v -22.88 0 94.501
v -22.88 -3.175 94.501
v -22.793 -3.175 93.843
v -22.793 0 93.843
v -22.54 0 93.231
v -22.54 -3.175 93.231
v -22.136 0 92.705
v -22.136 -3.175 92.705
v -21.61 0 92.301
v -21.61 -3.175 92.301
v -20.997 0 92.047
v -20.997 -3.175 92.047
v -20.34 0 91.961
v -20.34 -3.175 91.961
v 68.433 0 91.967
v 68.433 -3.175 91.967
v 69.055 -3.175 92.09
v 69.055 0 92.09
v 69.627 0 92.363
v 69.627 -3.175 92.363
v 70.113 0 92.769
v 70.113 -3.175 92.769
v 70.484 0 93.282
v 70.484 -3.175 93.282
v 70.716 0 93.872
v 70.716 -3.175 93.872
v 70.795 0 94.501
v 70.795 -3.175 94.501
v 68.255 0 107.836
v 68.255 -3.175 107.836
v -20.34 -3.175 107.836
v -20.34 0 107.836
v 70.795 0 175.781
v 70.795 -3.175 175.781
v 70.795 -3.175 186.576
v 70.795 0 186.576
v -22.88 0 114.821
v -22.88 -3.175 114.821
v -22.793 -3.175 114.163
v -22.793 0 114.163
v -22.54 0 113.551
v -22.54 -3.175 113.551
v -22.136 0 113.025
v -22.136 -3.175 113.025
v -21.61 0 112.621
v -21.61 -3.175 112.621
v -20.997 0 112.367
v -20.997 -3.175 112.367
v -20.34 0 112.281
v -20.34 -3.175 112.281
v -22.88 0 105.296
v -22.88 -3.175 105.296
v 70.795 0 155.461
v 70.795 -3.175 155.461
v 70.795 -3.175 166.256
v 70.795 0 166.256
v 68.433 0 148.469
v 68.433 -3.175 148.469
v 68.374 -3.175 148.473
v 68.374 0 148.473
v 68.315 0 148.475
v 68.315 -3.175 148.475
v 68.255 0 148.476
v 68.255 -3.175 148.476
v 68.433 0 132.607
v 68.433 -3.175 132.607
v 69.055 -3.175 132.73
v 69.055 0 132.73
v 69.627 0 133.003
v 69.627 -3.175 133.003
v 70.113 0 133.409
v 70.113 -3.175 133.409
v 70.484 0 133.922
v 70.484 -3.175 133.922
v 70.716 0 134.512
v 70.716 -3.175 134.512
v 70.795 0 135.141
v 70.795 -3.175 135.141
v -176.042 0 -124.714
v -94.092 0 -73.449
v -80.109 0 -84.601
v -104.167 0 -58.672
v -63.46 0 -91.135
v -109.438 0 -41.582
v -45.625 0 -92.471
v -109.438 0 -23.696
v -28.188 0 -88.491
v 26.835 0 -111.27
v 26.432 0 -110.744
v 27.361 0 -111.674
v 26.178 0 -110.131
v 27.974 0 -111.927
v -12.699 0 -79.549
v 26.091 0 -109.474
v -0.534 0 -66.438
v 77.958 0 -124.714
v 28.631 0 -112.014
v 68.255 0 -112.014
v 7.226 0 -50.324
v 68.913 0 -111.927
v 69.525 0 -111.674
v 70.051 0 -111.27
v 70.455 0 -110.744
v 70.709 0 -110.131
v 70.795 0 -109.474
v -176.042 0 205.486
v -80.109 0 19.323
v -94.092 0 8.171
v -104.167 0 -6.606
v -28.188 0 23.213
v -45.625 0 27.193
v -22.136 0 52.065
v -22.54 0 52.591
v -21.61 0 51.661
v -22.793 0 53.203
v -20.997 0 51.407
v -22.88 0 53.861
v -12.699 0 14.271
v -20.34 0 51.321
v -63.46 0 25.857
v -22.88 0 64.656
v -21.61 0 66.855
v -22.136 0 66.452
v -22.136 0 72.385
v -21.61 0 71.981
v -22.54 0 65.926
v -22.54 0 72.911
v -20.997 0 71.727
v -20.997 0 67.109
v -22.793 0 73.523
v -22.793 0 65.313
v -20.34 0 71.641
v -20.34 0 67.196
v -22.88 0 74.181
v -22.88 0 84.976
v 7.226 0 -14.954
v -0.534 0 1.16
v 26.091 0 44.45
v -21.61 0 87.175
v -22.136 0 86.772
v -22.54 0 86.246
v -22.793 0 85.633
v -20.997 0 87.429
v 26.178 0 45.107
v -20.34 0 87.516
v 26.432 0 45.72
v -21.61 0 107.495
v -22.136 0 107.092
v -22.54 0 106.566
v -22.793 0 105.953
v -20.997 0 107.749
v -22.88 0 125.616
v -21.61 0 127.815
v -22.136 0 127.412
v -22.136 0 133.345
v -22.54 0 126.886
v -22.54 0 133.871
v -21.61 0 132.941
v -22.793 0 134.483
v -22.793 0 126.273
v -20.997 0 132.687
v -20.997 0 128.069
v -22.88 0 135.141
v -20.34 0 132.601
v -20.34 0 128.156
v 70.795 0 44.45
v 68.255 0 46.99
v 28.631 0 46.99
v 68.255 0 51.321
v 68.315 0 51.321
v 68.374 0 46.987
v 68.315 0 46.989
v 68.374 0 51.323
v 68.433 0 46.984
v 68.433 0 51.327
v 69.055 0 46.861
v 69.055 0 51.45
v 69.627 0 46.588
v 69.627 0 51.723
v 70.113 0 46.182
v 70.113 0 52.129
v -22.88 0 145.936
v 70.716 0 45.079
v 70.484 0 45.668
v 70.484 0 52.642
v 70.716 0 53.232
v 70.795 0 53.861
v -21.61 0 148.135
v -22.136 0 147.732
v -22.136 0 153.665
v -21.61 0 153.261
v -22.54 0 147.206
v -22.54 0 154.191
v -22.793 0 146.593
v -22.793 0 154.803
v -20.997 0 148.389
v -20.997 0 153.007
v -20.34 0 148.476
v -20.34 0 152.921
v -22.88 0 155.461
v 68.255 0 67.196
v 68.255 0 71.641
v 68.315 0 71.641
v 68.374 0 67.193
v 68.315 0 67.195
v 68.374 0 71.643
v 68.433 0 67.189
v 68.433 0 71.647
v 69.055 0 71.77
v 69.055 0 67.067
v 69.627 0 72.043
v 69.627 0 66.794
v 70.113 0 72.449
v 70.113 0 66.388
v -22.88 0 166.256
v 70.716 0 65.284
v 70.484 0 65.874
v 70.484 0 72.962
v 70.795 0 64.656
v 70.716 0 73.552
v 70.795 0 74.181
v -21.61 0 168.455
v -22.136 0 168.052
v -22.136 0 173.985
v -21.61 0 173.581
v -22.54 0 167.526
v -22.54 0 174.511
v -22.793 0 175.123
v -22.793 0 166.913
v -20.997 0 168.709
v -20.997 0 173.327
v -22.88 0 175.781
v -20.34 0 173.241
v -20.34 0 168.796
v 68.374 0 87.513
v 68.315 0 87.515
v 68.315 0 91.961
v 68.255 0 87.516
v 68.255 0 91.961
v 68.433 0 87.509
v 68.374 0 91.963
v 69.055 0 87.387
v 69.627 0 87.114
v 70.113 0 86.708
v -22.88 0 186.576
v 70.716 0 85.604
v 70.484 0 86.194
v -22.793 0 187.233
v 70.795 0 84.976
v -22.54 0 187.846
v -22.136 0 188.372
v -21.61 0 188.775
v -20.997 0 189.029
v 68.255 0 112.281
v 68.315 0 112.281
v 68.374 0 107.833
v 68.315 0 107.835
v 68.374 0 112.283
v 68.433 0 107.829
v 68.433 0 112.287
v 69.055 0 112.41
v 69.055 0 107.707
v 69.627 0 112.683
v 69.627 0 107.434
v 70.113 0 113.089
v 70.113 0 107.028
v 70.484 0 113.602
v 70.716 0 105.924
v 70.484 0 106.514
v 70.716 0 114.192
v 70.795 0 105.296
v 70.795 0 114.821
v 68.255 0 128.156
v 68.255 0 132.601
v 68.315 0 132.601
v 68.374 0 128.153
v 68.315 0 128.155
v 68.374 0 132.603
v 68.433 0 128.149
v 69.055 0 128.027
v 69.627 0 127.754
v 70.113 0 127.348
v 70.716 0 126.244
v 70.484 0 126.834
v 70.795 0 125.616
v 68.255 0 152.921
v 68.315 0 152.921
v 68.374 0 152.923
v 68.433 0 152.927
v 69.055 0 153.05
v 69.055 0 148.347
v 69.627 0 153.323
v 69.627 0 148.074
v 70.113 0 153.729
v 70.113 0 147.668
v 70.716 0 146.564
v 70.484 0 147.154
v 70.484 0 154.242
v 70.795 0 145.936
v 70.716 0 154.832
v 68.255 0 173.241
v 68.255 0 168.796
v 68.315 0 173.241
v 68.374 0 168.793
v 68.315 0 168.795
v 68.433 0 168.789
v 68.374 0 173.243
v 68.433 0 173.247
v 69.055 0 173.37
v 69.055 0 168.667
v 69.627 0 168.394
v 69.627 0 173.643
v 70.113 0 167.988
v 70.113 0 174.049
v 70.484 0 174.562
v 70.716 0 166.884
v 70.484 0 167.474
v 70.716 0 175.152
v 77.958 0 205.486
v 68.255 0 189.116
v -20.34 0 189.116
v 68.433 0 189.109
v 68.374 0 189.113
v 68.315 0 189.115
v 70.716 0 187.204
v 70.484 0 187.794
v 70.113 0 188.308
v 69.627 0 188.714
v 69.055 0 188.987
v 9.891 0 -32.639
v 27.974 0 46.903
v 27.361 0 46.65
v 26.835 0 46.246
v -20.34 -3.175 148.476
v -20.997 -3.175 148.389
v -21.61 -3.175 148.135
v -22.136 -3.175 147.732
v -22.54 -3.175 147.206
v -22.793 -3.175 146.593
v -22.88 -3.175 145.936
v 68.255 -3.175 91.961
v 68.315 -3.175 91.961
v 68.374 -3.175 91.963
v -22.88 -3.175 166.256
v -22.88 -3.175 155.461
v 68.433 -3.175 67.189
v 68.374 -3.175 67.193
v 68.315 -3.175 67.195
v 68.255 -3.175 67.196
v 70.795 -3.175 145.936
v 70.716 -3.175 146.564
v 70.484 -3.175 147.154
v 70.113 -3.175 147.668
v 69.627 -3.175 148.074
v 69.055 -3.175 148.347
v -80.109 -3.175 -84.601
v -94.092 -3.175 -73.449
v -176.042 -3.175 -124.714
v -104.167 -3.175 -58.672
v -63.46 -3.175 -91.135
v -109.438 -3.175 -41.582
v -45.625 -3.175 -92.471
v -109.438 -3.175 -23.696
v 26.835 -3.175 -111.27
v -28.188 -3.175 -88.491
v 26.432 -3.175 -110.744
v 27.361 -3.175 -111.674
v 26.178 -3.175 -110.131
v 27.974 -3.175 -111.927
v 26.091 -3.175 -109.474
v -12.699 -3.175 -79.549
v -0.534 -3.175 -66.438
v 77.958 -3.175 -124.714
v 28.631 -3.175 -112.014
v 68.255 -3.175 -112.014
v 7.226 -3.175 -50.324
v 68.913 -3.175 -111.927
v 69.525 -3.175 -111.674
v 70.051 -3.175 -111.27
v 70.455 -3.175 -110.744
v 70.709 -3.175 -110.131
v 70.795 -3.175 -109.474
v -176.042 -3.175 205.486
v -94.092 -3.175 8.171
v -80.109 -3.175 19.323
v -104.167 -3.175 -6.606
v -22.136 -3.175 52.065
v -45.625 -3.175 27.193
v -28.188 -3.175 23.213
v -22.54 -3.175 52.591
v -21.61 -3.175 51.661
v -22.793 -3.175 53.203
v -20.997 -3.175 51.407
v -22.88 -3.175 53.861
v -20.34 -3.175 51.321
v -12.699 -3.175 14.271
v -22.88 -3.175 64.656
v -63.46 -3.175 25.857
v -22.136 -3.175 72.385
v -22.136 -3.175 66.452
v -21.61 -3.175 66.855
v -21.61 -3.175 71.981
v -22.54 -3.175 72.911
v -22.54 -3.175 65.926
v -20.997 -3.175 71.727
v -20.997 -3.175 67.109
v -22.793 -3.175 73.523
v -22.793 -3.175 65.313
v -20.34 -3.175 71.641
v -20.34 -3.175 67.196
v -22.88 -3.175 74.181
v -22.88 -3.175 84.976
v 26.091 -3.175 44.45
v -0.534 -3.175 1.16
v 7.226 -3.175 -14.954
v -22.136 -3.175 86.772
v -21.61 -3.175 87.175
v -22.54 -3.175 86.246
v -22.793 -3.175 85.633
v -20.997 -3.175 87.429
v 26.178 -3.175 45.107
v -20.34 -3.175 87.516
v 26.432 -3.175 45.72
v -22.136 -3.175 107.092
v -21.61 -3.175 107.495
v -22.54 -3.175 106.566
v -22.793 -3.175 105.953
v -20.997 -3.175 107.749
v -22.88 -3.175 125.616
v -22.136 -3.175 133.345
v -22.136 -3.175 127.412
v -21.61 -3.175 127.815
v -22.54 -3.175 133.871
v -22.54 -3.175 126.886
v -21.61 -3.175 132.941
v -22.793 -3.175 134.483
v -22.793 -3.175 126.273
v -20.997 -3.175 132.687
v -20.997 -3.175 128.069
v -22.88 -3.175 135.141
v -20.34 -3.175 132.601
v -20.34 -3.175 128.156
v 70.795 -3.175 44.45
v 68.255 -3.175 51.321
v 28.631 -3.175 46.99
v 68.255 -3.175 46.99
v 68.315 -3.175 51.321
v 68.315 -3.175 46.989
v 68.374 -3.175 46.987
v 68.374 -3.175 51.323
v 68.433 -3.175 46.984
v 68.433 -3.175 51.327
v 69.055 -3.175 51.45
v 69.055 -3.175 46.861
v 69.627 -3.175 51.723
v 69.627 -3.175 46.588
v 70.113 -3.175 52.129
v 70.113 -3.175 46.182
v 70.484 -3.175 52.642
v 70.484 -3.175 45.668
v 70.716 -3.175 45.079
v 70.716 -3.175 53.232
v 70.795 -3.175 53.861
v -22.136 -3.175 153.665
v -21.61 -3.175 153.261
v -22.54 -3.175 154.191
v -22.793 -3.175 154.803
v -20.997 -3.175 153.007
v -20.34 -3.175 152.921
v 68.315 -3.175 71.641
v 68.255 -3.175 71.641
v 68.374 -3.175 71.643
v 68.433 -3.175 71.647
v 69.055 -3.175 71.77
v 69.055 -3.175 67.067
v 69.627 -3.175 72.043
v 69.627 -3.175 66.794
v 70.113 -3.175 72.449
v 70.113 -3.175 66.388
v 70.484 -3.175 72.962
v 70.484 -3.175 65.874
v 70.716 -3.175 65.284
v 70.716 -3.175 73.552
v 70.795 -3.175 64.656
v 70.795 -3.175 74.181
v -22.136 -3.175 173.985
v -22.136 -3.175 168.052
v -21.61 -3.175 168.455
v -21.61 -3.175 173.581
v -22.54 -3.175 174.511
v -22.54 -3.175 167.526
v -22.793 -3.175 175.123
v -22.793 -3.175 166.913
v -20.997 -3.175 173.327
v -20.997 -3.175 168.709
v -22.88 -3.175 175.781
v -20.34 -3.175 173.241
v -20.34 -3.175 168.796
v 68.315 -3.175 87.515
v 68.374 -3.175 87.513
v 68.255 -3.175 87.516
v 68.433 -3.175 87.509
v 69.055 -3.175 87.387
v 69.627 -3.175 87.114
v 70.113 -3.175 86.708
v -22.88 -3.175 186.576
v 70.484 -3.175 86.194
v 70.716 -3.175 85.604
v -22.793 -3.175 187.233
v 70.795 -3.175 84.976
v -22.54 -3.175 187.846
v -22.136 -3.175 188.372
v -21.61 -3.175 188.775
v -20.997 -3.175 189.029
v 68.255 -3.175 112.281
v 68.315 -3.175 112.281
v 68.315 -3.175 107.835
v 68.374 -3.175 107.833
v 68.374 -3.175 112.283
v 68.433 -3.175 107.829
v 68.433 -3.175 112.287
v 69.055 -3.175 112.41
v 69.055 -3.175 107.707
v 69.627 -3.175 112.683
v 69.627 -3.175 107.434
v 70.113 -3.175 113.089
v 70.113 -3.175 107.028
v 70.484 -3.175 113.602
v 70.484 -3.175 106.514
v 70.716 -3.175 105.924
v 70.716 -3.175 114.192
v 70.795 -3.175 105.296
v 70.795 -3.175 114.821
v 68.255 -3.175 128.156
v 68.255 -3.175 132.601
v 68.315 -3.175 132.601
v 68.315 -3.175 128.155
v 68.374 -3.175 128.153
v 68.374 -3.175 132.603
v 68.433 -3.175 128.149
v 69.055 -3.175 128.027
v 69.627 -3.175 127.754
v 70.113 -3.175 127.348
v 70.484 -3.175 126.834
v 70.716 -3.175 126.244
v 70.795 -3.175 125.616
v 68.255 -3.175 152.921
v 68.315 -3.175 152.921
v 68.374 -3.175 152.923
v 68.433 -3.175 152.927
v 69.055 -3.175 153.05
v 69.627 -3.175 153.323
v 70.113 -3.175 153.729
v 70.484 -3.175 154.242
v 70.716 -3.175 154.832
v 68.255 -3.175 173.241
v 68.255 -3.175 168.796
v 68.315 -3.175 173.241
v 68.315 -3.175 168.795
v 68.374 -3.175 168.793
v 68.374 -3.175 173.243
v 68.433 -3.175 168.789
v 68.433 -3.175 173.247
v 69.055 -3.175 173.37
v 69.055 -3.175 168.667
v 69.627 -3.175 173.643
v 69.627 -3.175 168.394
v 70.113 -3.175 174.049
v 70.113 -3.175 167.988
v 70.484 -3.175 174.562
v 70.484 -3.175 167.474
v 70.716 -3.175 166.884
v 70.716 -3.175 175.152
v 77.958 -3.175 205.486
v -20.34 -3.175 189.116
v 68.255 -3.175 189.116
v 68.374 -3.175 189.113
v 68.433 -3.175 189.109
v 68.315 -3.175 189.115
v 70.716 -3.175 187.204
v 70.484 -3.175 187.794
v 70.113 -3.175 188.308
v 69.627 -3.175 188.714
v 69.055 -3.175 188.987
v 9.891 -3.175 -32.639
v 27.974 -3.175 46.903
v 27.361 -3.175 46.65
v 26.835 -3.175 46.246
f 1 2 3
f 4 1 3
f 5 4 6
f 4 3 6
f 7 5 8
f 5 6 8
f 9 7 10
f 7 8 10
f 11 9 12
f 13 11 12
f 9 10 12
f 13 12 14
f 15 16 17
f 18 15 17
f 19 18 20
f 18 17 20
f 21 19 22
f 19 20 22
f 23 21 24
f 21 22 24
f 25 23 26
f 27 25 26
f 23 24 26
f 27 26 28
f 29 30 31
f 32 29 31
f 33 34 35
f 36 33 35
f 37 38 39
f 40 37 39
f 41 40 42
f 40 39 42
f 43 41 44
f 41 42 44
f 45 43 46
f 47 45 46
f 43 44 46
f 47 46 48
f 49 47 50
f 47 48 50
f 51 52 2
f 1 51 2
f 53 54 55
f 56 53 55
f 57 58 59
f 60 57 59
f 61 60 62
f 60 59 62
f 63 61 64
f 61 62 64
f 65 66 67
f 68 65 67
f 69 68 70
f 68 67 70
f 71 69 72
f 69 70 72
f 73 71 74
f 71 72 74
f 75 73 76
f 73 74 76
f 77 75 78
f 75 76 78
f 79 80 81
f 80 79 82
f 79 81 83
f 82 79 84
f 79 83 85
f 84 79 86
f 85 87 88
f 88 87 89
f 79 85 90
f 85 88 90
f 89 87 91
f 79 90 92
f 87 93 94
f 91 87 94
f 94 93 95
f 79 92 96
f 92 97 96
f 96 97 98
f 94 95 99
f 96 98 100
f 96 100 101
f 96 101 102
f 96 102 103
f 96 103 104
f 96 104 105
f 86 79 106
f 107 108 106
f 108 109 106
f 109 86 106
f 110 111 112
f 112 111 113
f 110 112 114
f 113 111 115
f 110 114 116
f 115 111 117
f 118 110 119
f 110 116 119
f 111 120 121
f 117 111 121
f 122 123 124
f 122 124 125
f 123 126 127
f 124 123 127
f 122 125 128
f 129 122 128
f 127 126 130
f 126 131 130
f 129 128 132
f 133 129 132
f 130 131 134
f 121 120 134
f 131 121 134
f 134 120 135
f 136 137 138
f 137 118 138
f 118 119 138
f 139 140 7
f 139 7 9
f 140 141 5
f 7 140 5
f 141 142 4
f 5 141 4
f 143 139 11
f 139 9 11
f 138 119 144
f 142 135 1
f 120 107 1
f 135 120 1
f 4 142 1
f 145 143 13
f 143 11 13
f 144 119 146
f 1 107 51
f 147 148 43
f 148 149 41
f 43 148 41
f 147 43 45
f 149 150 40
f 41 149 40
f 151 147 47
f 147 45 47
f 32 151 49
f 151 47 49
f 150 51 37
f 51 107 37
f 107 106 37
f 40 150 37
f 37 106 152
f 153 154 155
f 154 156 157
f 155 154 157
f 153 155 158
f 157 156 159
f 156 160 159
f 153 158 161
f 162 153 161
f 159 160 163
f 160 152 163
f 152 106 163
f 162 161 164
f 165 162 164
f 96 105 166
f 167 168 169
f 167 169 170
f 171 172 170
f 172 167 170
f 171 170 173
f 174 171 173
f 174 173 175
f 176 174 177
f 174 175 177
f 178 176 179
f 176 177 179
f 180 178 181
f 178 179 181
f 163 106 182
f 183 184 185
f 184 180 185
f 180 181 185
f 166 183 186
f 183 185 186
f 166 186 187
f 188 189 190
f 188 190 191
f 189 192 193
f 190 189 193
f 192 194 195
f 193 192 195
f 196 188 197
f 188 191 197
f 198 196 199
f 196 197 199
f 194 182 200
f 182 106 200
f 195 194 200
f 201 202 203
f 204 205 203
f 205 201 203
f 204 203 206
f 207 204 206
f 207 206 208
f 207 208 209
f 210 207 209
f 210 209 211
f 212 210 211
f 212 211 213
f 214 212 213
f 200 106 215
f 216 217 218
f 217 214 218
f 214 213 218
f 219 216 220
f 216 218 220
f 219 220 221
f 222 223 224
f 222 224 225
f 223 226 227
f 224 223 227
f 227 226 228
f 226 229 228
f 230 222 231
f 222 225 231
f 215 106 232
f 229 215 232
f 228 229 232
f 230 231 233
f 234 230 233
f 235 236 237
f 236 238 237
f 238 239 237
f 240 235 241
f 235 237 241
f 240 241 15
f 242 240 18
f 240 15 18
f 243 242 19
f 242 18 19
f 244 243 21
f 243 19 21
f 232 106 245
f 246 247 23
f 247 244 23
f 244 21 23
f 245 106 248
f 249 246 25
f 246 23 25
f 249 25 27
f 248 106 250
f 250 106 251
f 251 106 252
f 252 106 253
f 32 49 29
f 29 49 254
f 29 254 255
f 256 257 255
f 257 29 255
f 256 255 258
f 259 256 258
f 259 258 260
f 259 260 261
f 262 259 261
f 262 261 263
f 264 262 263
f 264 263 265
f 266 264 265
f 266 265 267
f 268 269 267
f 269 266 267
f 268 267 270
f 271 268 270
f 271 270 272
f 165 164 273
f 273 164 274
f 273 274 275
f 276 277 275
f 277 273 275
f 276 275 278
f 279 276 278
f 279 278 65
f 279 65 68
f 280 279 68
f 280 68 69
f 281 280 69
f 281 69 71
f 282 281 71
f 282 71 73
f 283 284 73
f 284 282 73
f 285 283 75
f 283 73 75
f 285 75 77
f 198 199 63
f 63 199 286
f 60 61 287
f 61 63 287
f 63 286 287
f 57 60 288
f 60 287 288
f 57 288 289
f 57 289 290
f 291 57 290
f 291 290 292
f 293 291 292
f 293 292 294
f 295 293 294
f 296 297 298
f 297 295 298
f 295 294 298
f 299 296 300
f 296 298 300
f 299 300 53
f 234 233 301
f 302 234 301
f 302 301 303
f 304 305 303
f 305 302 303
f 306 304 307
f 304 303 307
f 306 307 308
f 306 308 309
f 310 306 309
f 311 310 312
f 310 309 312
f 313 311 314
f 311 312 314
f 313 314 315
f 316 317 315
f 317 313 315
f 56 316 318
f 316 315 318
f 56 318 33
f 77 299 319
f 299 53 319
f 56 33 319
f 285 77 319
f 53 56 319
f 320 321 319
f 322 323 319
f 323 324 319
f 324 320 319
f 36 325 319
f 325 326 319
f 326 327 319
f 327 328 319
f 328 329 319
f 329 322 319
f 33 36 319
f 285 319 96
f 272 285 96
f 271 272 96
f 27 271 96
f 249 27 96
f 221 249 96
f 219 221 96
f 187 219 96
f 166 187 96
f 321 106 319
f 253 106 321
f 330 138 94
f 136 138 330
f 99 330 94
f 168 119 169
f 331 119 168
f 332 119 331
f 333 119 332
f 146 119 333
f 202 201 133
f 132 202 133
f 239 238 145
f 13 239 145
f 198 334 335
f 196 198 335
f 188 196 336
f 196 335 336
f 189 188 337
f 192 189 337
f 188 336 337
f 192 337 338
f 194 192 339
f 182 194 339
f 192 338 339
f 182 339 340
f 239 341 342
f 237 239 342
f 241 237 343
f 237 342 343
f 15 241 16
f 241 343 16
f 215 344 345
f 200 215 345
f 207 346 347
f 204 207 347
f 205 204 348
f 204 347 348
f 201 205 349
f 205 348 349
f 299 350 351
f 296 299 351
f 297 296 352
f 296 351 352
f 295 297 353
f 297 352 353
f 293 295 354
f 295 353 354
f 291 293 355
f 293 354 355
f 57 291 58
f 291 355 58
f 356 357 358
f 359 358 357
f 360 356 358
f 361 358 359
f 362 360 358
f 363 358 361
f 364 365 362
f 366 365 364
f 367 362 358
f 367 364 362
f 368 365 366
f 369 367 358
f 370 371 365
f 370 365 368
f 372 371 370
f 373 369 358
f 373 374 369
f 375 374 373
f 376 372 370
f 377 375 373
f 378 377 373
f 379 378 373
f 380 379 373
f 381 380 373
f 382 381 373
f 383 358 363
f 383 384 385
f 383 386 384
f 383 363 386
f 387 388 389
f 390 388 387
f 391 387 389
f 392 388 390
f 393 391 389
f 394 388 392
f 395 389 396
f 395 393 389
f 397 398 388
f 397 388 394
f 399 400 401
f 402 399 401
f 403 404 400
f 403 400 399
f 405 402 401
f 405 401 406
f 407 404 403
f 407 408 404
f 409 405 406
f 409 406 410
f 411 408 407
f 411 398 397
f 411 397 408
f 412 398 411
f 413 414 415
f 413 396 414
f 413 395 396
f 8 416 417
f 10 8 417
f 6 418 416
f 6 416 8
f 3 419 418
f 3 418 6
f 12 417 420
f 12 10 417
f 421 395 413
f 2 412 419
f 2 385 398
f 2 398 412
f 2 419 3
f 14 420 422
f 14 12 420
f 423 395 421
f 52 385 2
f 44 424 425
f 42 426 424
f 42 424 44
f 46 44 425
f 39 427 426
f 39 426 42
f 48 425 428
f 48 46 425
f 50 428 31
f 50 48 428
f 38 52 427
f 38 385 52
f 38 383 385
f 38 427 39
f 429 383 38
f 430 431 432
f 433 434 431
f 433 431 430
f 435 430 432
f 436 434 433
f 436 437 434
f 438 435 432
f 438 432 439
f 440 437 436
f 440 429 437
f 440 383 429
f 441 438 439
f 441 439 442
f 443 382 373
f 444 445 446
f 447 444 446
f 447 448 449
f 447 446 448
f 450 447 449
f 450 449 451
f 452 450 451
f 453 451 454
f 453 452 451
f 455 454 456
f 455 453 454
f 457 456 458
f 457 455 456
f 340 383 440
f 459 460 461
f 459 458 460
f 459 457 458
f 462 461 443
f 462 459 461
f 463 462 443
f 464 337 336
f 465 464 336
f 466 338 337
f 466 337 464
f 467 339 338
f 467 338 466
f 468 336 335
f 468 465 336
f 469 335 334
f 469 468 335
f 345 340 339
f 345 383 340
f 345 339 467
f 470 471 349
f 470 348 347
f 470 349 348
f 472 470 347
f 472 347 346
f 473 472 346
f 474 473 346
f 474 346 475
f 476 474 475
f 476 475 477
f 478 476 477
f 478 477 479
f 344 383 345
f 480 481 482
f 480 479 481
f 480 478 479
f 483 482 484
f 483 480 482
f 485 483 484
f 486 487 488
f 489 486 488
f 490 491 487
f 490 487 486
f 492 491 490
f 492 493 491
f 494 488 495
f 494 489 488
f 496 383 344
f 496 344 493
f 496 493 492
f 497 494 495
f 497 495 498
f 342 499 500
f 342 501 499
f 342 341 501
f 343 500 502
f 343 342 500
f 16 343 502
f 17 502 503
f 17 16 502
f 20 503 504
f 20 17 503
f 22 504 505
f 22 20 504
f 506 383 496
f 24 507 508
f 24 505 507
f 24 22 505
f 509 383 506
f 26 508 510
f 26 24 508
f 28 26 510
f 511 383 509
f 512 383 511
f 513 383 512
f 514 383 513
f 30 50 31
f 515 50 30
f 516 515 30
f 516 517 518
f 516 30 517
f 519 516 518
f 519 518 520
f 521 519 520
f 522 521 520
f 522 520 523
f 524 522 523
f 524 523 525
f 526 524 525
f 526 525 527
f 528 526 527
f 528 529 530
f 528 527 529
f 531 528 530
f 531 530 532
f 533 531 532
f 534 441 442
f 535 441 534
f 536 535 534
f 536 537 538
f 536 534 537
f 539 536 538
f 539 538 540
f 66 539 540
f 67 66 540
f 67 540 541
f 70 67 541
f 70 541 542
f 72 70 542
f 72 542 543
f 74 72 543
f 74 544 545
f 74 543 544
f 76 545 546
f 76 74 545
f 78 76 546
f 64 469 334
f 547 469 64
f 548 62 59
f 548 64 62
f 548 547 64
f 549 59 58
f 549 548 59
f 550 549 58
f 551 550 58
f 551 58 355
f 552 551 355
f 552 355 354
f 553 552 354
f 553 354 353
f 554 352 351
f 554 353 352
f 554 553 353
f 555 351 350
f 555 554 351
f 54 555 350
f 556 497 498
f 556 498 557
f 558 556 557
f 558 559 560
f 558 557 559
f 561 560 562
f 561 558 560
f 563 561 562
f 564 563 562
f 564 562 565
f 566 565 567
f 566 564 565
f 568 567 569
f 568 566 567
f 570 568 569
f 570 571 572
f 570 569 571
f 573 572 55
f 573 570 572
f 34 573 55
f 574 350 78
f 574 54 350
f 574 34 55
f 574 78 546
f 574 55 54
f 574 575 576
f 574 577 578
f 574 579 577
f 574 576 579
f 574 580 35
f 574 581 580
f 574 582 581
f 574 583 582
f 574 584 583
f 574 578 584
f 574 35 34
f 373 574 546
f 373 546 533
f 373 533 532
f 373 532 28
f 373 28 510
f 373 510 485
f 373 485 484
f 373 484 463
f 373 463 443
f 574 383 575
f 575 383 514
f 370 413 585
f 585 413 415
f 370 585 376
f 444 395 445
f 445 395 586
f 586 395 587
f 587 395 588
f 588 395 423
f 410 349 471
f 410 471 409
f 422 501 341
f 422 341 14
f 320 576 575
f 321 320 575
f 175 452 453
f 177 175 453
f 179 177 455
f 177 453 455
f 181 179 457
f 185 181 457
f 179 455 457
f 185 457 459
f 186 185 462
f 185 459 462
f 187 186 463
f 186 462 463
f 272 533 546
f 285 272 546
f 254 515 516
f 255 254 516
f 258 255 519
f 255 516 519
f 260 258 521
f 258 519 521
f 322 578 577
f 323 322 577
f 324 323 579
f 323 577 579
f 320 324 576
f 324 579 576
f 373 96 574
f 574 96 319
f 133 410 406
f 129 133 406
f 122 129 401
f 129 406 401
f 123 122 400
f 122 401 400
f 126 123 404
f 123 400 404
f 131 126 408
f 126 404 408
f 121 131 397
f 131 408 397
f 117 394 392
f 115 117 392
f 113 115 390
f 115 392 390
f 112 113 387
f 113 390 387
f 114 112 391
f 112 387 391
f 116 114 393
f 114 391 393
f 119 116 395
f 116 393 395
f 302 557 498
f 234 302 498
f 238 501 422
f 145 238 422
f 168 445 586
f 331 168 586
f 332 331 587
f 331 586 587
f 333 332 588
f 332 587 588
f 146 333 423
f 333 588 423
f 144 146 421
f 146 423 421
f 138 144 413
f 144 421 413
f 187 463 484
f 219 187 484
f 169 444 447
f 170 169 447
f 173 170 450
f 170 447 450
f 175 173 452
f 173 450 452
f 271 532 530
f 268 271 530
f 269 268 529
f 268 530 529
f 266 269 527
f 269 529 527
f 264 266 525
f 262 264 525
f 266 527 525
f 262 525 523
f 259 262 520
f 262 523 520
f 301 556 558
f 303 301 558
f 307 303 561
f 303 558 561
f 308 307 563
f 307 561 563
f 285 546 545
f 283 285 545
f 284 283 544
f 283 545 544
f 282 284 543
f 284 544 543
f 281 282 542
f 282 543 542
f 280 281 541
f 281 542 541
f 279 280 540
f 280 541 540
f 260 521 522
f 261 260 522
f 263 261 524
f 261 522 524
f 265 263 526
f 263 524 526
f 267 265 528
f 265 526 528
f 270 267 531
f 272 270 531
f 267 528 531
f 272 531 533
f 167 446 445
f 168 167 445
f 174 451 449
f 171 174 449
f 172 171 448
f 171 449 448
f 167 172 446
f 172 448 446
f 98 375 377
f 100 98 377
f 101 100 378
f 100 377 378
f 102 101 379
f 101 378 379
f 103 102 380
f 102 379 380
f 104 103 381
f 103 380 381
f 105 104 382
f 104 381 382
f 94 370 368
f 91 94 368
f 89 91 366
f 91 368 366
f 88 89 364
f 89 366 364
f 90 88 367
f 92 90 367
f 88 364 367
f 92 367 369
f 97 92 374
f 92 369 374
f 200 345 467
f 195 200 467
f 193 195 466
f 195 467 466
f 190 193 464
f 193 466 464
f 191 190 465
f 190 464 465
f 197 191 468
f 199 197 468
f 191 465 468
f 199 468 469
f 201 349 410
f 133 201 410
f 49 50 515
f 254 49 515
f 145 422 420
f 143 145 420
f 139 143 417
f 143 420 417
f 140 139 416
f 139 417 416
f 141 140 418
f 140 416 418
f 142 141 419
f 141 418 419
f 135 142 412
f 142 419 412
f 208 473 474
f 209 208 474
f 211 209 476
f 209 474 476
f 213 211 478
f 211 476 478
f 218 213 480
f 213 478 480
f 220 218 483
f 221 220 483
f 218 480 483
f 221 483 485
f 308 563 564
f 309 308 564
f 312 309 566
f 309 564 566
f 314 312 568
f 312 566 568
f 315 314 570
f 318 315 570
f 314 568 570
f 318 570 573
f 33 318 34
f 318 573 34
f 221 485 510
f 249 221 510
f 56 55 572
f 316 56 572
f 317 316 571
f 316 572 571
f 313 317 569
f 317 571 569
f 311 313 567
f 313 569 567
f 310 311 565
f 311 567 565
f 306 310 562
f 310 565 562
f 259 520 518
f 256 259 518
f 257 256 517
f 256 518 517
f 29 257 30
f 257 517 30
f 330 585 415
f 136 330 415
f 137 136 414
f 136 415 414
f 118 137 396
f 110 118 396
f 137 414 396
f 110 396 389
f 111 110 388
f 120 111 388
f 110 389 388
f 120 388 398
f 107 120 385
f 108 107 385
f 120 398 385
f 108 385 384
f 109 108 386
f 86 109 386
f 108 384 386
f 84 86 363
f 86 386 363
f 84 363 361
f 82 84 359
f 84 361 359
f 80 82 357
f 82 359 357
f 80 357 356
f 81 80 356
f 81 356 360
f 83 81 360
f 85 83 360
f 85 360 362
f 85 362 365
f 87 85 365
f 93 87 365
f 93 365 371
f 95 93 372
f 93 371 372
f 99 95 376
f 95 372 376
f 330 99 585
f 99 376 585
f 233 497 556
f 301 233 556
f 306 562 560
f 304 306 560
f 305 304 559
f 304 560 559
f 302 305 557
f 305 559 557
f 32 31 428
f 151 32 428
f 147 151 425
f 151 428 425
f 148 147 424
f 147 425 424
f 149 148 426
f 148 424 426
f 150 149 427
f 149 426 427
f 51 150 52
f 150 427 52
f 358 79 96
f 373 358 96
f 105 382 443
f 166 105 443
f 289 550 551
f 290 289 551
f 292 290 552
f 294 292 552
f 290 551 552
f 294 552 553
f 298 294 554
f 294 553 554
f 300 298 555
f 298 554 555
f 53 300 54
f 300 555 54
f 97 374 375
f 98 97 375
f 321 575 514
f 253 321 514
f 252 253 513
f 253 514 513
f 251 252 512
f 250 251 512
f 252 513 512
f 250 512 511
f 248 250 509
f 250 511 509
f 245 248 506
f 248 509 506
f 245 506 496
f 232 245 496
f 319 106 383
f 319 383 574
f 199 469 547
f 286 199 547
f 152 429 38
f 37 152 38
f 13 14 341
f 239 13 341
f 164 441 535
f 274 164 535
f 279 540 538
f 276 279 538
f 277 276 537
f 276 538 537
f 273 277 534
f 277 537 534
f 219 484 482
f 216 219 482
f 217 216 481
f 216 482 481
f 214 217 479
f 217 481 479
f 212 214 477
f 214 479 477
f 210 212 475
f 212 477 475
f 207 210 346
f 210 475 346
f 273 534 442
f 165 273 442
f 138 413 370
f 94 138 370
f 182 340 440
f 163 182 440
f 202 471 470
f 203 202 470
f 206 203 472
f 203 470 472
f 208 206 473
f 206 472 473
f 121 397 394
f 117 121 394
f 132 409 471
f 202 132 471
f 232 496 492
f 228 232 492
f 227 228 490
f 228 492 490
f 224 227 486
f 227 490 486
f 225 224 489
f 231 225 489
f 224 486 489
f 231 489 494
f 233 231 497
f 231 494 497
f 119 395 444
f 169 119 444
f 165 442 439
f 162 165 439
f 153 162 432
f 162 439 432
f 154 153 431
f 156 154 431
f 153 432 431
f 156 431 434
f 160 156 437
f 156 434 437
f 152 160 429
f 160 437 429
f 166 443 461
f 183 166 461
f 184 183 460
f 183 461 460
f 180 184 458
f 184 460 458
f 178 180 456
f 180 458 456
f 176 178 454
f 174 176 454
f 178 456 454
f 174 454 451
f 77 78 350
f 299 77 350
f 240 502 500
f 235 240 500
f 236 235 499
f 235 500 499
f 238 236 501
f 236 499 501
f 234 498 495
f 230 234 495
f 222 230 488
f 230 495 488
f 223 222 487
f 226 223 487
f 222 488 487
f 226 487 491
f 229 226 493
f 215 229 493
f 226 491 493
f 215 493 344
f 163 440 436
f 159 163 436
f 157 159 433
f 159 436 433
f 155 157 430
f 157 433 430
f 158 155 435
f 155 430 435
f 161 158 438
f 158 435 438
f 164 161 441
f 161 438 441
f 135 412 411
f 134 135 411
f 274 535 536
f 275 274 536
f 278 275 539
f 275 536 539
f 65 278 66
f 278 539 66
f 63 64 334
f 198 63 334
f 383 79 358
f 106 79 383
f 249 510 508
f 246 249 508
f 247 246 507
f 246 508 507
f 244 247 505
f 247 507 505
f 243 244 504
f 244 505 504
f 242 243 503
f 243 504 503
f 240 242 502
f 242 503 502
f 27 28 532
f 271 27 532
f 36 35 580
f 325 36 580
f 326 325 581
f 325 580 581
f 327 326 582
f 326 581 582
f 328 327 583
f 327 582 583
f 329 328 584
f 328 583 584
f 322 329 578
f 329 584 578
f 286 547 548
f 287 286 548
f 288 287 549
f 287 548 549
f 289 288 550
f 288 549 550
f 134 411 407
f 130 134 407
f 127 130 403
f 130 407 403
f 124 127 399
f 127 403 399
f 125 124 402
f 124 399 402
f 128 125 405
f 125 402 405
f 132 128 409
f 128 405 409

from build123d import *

# Parameters (mm, degrees)
F0_W     = 254
F0_H     = 330.2
F1_DEPTH = 3.175
F3_DEPTH = 3.175
F4_R     = 60
F5_DEPTH = 3.175


with BuildPart() as f1:
    # F0 (on Front) → F1 (new body)
    with BuildSketch(Plane.XZ):
        with Locations((-49.04184, 40.386009)):
            Rectangle(F0_W, F0_H)
    extrude(amount=F1_DEPTH)

    # F2 (on face) → F3 (cut, through all)
    with BuildSketch(Plane.XZ.offset(3.175)):
        with BuildLine():
            ThreePointArc((68.25536, 173.240709), (68.344315, 173.242267), (68.43316, 173.24694))
            Line((68.43316, 173.24694), (68.43316, 189.109479))
            ThreePointArc((68.43316, 189.109479), (68.344315, 189.114151), (68.25536, 189.115709))
            Line((68.25536, 189.115709), (-20.33984, 189.115709))
            ThreePointArc((-20.33984, 189.115709), (-22.135891, 188.371761), (-22.87984, 186.575709))
            Line((-22.87984, 186.575709), (-22.87984, 175.780709))
            ThreePointArc((-22.87984, 175.780709), (-22.135891, 173.984658), (-20.33984, 173.240709))
            Line((-20.33984, 173.240709), (68.25536, 173.240709))
        make_face()
        with BuildLine():
            Line((68.43316, 189.109479), (68.43316, 173.24694))
            ThreePointArc((68.43316, 173.24694), (70.11321, 174.04866), (70.79536, 175.780709))
            Line((70.79536, 175.780709), (70.79536, 186.575709))
            ThreePointArc((70.79536, 186.575709), (70.11321, 188.307758), (68.43316, 189.109479))
        make_face()
        with BuildLine():
            ThreePointArc((68.25536, 152.920709), (68.344315, 152.922267), (68.43316, 152.92694))
            Line((68.43316, 152.92694), (68.43316, 168.789479))
            ThreePointArc((68.43316, 168.789479), (68.344315, 168.794151), (68.25536, 168.795709))
            Line((68.25536, 168.795709), (-20.33984, 168.795709))
            ThreePointArc((-20.33984, 168.795709), (-22.135891, 168.051761), (-22.87984, 166.255709))
            Line((-22.87984, 166.255709), (-22.87984, 155.460709))
            ThreePointArc((-22.87984, 155.460709), (-22.135891, 153.664658), (-20.33984, 152.920709))
            Line((-20.33984, 152.920709), (68.25536, 152.920709))
        make_face()
        with BuildLine():
            Line((68.43316, 168.789479), (68.43316, 152.92694))
            ThreePointArc((68.43316, 152.92694), (70.11321, 153.72866), (70.79536, 155.460709))
            Line((70.79536, 155.460709), (70.79536, 166.255709))
            ThreePointArc((70.79536, 166.255709), (70.11321, 167.987758), (68.43316, 168.789479))
        make_face()
        with BuildLine():
            ThreePointArc((68.25536, 132.600709), (68.344315, 132.602267), (68.43316, 132.60694))
            Line((68.43316, 132.60694), (68.43316, 148.469479))
            ThreePointArc((68.43316, 148.469479), (68.344315, 148.474151), (68.25536, 148.475709))
            Line((68.25536, 148.475709), (-20.33984, 148.475709))
            ThreePointArc((-20.33984, 148.475709), (-22.135891, 147.731761), (-22.87984, 145.935709))
            Line((-22.87984, 145.935709), (-22.87984, 135.140709))
            ThreePointArc((-22.87984, 135.140709), (-22.135891, 133.344658), (-20.33984, 132.600709))
            Line((-20.33984, 132.600709), (68.25536, 132.600709))
        make_face()
        with BuildLine():
            Line((68.43316, 148.469479), (68.43316, 132.60694))
            ThreePointArc((68.43316, 132.60694), (70.11321, 133.40866), (70.79536, 135.140709))
            Line((70.79536, 135.140709), (70.79536, 145.935709))
            ThreePointArc((70.79536, 145.935709), (70.11321, 147.667758), (68.43316, 148.469479))
        make_face()
        with BuildLine():
            ThreePointArc((68.25536, 112.280709), (68.344315, 112.282267), (68.43316, 112.28694))
            Line((68.43316, 112.28694), (68.43316, 128.149479))
            ThreePointArc((68.43316, 128.149479), (68.344315, 128.154151), (68.25536, 128.155709))
            Line((68.25536, 128.155709), (-20.33984, 128.155709))
            ThreePointArc((-20.33984, 128.155709), (-22.135891, 127.411761), (-22.87984, 125.615709))
            Line((-22.87984, 125.615709), (-22.87984, 114.820709))
            ThreePointArc((-22.87984, 114.820709), (-22.135891, 113.024658), (-20.33984, 112.280709))
            Line((-20.33984, 112.280709), (68.25536, 112.280709))
        make_face()
        with BuildLine():
            Line((68.43316, 128.149479), (68.43316, 112.28694))
            ThreePointArc((68.43316, 112.28694), (70.11321, 113.08866), (70.79536, 114.820709))
            Line((70.79536, 114.820709), (70.79536, 125.615709))
            ThreePointArc((70.79536, 125.615709), (70.11321, 127.347758), (68.43316, 128.149479))
        make_face()
        with BuildLine():
            ThreePointArc((68.25536, 91.960709), (68.344315, 91.962267), (68.43316, 91.96694))
            Line((68.43316, 91.96694), (68.43316, 107.829479))
            ThreePointArc((68.43316, 107.829479), (68.344315, 107.834151), (68.25536, 107.835709))
            Line((68.25536, 107.835709), (-20.33984, 107.835709))
            ThreePointArc((-20.33984, 107.835709), (-22.135891, 107.091761), (-22.87984, 105.295709))
            Line((-22.87984, 105.295709), (-22.87984, 94.500709))
            ThreePointArc((-22.87984, 94.500709), (-22.135891, 92.704658), (-20.33984, 91.960709))
            Line((-20.33984, 91.960709), (68.25536, 91.960709))
        make_face()
        with BuildLine():
            Line((68.43316, 107.829479), (68.43316, 91.96694))
            ThreePointArc((68.43316, 91.96694), (70.11321, 92.76866), (70.79536, 94.500709))
            Line((70.79536, 94.500709), (70.79536, 105.295709))
            ThreePointArc((70.79536, 105.295709), (70.11321, 107.027758), (68.43316, 107.829479))
        make_face()
        with BuildLine():
            ThreePointArc((68.25536, 71.640709), (68.344315, 71.642267), (68.43316, 71.64694))
            Line((68.43316, 71.64694), (68.43316, 87.509479))
            ThreePointArc((68.43316, 87.509479), (68.344315, 87.514151), (68.25536, 87.515709))
            Line((68.25536, 87.515709), (-20.33984, 87.515709))
            ThreePointArc((-20.33984, 87.515709), (-22.135891, 86.771761), (-22.87984, 84.975709))
            Line((-22.87984, 84.975709), (-22.87984, 74.180709))
            ThreePointArc((-22.87984, 74.180709), (-22.135891, 72.384658), (-20.33984, 71.640709))
            Line((-20.33984, 71.640709), (68.25536, 71.640709))
        make_face()
        with BuildLine():
            Line((68.43316, 87.509479), (68.43316, 71.64694))
            ThreePointArc((68.43316, 71.64694), (70.11321, 72.44866), (70.79536, 74.180709))
            Line((70.79536, 74.180709), (70.79536, 84.975709))
            ThreePointArc((70.79536, 84.975709), (70.11321, 86.707758), (68.43316, 87.509479))
        make_face()
        with BuildLine():
            ThreePointArc((68.25536, 51.320709), (68.344315, 51.322267), (68.43316, 51.32694))
            Line((68.43316, 51.32694), (68.43316, 67.189479))
            ThreePointArc((68.43316, 67.189479), (68.344315, 67.194151), (68.25536, 67.195709))
            Line((68.25536, 67.195709), (-20.33984, 67.195709))
            ThreePointArc((-20.33984, 67.195709), (-22.135891, 66.451761), (-22.87984, 64.655709))
            Line((-22.87984, 64.655709), (-22.87984, 53.860709))
            ThreePointArc((-22.87984, 53.860709), (-22.135891, 52.064658), (-20.33984, 51.320709))
            Line((-20.33984, 51.320709), (68.25536, 51.320709))
        make_face()
        with BuildLine():
            Line((68.43316, 67.189479), (68.43316, 51.32694))
            ThreePointArc((68.43316, 51.32694), (70.11321, 52.12866), (70.79536, 53.860709))
            Line((70.79536, 53.860709), (70.79536, 64.655709))
            ThreePointArc((70.79536, 64.655709), (70.11321, 66.387758), (68.43316, 67.189479))
        make_face()
        with BuildLine():
            Line((68.25536, 46.990009), (28.63136, 46.990009))
            ThreePointArc((28.63136, 46.990009), (26.835309, 46.246061), (26.09136, 44.450009))
            Line((26.09136, 44.450009), (26.09136, -109.473991))
            ThreePointArc((26.09136, -109.473991), (26.835309, -111.270042), (28.63136, -112.013991))
            Line((28.63136, -112.013991), (68.25536, -112.013991))
            ThreePointArc((68.25536, -112.013991), (70.051412, -111.270042), (70.79536, -109.473991))
            Line((70.79536, -109.473991), (70.79536, 44.450009))
            ThreePointArc((70.79536, 44.450009), (70.11321, 46.182058), (68.43316, 46.983779))
            ThreePointArc((68.43316, 46.983779), (68.344315, 46.988451), (68.25536, 46.990009))
        make_face()
    extrude(amount=-F3_DEPTH, mode=Mode.SUBTRACT)

    # F4 (on face) → F5 (cut, through all)
    with BuildSketch(Plane.XZ.offset(3.175)):
        with Locations((-50.10864, -32.638991)):
            Circle(F4_R)
    extrude(amount=-F5_DEPTH, mode=Mode.SUBTRACT)


solid = f1.part
